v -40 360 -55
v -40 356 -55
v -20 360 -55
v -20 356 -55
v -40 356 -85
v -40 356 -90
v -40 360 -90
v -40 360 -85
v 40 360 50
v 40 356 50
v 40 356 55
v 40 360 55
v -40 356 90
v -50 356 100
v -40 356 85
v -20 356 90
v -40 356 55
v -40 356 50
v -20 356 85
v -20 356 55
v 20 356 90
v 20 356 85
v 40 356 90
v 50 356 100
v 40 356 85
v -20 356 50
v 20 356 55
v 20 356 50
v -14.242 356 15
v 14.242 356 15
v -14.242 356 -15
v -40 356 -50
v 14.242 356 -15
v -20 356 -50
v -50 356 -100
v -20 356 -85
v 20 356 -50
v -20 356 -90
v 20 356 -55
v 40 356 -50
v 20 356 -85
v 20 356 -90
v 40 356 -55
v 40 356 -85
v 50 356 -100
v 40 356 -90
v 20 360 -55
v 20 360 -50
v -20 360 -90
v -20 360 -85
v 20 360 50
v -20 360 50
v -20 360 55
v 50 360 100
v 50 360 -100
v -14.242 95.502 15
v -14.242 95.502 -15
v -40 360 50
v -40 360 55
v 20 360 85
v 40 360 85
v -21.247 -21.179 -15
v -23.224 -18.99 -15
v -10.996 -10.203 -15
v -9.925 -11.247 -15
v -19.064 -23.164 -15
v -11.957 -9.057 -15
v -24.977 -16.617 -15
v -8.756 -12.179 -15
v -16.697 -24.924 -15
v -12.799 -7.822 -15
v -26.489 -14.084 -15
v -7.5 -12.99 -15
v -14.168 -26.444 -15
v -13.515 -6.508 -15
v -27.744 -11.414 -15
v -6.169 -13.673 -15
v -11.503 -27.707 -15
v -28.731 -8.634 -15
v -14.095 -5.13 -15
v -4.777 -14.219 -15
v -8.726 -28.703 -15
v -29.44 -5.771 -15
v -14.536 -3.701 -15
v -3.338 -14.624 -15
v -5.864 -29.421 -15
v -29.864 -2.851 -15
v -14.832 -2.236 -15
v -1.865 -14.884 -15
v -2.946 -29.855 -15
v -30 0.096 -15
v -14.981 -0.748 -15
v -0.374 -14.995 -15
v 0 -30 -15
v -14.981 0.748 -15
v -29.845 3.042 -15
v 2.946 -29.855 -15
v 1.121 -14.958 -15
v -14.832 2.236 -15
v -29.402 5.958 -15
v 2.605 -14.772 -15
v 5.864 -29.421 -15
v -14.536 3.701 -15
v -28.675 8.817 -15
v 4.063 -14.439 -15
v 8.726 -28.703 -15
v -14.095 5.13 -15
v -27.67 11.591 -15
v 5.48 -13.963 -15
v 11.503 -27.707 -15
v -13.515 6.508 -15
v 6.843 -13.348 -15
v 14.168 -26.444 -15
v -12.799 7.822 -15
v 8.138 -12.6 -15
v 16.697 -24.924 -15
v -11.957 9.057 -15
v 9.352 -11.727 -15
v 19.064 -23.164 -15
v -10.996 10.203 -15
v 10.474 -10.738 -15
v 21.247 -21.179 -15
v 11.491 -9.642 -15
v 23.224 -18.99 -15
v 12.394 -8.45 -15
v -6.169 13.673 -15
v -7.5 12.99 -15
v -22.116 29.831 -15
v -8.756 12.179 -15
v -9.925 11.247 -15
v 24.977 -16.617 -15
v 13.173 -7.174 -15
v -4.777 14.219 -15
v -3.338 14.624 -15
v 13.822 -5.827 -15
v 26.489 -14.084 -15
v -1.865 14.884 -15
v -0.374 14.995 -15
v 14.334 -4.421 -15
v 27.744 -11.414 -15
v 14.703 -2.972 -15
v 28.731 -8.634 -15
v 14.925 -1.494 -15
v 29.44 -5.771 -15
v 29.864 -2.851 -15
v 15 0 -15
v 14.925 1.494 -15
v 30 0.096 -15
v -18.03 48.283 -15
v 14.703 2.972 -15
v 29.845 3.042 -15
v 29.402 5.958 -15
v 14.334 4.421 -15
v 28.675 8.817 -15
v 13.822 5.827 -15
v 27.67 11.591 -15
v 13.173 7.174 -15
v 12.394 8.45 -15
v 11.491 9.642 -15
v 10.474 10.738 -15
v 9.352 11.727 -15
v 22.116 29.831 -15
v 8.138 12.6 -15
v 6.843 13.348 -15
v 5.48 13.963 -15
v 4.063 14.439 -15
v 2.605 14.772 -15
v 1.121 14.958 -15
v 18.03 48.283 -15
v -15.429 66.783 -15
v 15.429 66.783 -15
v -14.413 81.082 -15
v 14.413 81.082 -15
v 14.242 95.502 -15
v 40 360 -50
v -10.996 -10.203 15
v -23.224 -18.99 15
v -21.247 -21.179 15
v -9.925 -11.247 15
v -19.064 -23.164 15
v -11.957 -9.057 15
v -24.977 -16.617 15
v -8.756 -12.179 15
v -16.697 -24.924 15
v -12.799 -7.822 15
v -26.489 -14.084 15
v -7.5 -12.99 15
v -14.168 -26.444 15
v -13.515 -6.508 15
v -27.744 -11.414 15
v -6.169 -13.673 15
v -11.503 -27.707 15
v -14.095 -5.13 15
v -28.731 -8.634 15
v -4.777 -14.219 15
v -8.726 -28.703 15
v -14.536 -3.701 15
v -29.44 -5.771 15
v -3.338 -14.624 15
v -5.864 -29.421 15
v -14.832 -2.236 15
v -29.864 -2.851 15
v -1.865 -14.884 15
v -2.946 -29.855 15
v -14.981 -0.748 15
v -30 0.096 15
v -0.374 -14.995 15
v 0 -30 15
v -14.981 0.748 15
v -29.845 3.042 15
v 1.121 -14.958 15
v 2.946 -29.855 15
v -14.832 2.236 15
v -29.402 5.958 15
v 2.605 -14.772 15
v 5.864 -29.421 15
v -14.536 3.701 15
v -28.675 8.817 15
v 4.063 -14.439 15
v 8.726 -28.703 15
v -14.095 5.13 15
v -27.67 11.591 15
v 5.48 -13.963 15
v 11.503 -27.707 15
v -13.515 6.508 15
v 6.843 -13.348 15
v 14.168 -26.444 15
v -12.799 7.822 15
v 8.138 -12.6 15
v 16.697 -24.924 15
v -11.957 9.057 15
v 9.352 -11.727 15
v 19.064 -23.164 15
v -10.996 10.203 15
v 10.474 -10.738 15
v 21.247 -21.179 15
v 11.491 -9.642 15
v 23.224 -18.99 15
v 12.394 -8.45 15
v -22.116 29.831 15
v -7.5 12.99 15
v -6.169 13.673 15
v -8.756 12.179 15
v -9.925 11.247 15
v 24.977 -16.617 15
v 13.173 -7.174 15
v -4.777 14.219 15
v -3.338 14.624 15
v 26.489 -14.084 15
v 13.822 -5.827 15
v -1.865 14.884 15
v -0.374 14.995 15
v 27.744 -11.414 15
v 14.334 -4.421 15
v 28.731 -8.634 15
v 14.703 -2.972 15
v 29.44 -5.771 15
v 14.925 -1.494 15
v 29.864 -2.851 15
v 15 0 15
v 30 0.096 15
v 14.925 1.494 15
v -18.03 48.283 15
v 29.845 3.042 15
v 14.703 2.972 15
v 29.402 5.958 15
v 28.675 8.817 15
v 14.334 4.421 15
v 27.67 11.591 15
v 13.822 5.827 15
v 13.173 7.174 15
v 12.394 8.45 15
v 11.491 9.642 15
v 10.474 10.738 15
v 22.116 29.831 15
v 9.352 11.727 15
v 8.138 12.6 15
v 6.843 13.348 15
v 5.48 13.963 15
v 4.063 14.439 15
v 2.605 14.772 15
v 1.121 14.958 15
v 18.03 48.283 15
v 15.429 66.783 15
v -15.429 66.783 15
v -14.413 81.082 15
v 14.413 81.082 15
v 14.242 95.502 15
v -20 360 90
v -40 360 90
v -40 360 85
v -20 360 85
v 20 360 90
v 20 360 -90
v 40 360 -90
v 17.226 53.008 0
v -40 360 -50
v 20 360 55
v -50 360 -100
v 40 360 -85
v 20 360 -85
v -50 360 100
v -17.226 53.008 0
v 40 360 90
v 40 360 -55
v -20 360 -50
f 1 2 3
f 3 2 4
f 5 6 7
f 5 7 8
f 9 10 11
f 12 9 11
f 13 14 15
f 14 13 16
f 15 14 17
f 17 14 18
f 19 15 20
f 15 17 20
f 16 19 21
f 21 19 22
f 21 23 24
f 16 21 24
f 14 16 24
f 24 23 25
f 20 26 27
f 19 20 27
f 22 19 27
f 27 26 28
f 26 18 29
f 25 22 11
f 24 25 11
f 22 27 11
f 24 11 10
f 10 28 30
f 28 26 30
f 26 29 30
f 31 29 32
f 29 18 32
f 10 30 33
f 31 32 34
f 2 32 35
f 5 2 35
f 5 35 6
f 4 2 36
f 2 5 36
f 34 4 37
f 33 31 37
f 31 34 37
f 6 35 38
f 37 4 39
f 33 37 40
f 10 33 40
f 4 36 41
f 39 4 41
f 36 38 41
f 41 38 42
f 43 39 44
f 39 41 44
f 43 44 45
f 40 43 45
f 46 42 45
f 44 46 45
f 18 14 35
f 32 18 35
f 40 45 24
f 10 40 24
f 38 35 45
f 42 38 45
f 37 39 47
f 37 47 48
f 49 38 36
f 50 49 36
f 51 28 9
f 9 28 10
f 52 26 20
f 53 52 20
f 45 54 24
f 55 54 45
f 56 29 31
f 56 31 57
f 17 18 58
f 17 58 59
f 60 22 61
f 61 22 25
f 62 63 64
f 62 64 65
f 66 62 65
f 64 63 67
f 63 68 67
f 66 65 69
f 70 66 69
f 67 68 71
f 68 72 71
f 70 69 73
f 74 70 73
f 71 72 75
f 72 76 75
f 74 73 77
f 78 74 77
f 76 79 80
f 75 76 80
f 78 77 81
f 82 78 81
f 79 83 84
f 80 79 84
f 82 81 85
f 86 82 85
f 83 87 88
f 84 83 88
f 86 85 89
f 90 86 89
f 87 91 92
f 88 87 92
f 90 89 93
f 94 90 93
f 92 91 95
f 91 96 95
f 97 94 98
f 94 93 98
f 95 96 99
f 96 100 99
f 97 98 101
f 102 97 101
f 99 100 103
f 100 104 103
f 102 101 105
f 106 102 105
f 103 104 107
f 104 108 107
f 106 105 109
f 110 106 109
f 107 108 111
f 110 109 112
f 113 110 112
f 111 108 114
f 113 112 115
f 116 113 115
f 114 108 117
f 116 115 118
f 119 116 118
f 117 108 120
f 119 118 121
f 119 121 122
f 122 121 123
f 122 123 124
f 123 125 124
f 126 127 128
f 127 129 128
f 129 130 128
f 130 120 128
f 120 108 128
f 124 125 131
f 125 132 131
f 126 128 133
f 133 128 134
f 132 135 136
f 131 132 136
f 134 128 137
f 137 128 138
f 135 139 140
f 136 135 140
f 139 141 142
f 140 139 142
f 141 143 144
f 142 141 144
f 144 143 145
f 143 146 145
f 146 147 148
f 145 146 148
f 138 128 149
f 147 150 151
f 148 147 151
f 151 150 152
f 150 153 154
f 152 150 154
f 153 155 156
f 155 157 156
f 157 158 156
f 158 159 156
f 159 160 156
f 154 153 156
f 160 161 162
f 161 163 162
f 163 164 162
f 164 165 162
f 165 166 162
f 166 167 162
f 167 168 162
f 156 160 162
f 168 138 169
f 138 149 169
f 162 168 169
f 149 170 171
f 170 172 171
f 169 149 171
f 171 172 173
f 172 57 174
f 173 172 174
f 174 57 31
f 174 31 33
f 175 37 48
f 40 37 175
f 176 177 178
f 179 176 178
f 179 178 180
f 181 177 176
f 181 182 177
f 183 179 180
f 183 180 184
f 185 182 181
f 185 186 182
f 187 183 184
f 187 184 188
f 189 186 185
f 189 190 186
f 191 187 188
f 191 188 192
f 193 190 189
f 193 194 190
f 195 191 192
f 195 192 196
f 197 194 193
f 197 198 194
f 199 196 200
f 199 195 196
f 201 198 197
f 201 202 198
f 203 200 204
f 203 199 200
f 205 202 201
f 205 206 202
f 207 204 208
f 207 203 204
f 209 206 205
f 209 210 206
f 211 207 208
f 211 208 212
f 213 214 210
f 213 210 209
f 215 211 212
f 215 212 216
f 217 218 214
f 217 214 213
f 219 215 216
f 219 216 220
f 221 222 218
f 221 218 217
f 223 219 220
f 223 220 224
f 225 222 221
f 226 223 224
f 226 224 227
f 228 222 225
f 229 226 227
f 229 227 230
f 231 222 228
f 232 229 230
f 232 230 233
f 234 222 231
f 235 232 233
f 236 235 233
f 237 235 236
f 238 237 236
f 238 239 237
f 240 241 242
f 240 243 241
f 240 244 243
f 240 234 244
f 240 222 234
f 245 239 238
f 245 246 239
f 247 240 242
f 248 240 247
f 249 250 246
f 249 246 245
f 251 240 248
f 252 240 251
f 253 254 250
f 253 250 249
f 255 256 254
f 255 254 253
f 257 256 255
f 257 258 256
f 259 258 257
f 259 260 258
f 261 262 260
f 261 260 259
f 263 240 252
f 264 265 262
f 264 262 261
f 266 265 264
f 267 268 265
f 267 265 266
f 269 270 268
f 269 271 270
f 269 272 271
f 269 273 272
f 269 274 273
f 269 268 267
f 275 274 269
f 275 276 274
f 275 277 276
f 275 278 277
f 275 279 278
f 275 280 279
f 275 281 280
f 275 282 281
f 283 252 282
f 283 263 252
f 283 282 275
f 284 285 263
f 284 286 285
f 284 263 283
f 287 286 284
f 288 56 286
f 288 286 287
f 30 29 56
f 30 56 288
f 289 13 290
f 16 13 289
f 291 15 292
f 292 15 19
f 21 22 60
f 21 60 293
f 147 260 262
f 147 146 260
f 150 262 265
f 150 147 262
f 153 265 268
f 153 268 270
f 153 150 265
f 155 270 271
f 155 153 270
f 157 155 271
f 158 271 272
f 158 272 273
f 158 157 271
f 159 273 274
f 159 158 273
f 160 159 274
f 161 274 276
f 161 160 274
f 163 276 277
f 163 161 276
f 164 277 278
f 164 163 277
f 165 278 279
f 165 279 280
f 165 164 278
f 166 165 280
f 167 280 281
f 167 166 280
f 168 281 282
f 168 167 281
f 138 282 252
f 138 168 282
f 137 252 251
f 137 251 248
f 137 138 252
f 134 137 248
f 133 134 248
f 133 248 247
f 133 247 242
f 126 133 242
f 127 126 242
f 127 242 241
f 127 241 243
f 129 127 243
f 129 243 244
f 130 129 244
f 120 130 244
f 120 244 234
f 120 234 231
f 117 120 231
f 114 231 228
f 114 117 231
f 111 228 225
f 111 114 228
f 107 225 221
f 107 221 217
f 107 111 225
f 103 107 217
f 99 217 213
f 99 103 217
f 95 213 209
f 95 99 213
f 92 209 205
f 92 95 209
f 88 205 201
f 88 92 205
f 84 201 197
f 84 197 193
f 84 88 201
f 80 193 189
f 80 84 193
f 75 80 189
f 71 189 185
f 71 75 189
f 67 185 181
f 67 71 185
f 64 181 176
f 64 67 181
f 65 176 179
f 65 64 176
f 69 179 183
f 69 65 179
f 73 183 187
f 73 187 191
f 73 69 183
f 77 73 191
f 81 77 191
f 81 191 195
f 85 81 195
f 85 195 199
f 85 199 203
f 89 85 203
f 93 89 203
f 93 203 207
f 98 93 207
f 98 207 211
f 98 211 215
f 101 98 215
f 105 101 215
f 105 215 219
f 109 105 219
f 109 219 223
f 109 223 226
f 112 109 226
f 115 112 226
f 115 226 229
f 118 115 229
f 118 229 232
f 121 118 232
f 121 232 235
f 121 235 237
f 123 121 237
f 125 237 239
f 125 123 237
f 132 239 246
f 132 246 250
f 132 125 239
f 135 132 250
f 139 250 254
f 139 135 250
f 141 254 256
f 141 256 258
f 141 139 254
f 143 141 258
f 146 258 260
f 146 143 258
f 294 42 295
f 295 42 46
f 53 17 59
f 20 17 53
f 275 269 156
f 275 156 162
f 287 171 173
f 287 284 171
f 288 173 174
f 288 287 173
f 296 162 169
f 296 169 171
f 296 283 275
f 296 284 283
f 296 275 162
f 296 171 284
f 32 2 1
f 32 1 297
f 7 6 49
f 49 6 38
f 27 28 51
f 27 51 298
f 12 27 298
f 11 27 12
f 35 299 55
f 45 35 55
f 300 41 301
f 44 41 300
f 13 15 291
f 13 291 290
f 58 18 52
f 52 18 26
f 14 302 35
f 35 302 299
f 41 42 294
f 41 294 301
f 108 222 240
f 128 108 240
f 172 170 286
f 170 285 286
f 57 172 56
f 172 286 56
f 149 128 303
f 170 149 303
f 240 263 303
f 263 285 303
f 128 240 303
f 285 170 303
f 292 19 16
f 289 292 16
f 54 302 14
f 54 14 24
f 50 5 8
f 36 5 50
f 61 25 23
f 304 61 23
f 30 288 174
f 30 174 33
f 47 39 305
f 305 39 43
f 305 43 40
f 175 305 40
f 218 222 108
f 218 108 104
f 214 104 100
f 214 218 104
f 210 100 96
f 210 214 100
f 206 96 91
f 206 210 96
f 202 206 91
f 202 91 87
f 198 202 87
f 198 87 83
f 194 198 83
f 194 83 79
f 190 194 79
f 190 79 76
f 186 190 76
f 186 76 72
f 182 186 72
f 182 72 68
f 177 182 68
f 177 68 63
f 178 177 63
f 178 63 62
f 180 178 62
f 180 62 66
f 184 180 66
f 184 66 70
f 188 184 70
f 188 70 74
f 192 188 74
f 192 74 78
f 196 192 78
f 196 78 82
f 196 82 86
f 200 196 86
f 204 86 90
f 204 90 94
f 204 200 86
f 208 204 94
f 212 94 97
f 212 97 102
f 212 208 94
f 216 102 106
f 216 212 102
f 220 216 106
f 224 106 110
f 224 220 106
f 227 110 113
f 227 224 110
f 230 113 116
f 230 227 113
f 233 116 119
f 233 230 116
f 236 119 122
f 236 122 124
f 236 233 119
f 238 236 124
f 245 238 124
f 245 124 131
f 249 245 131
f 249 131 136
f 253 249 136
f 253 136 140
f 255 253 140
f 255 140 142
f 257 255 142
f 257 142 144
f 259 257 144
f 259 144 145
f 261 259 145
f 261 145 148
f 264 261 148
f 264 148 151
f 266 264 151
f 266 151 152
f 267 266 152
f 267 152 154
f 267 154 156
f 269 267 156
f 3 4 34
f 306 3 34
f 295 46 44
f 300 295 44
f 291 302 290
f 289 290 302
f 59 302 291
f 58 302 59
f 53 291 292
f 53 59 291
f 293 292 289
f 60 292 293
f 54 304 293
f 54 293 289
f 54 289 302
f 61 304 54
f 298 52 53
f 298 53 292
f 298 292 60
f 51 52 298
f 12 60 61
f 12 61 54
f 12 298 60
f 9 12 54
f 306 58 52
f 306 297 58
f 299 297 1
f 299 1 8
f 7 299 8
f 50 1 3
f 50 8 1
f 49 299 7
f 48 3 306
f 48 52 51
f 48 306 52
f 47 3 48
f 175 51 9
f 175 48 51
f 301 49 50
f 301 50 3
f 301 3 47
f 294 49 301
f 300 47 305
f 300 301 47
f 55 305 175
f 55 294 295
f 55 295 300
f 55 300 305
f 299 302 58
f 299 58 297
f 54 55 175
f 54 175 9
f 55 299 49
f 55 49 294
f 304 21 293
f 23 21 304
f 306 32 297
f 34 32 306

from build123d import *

# Parameters (mm, degrees)
SKETCH1_R           = 30
SKETCH1_R_2         = 15
BOSS_EXTRUDE1_DEPTH = 15
BOSS_EXTRUDE2_DEPTH = 30
SKETCH3_W           = 100
SKETCH3_H           = 200
BOSS_EXTRUDE3_DEPTH = 4
SKETCH4_W           = 20
SKETCH4_H           = 5
CUT_EXTRUDE1_DEPTH  = 4


with BuildPart() as part:
    # Sketch1 → Boss-Extrude1 (new body, symmetric)
    with BuildSketch(Plane.XY):
        Circle(SKETCH1_R)
        Circle(SKETCH1_R_2, mode=Mode.SUBTRACT)
    extrude(amount=BOSS_EXTRUDE1_DEPTH, both=True)

    # Sketch2 → Boss-Extrude2 (add)
    with BuildSketch(Plane.XY.offset(15)):
        with BuildLine():
            Line((14.241500135, 95.50219019), (14.241500135, 360))
            Line((14.241500135, 360), (-14.241500135, 360))
            Line((-14.241500135, 360), (-14.241500135, 95.50219019))
            add(Edge.make_bspline(
                [(-27.670395385, 11.590911061), (-13.495600511, 52.469413615), (-14.241500135, 95.50219019)],
                knots=[0, 0, 0, 1, 1, 1], degree=2))
            ThreePointArc((-27.670395385, 11.590911061), (0, 30), (27.670395385, 11.590911061))
            add(Edge.make_bspline(
                [(27.670395385, 11.590911061), (13.495600511, 52.469413615), (14.241500135, 95.50219019)],
                knots=[0, 0, 0, 1, 1, 1], degree=2))
        make_face()
    extrude(amount=-BOSS_EXTRUDE2_DEPTH)

    # Sketch3 → Boss-Extrude3 (add)
    with BuildSketch(Plane(origin=(0, 360, 0), x_dir=(1, 0, 0), z_dir=(0, 1, 0))):
        Rectangle(SKETCH3_W, SKETCH3_H)
    extrude(amount=-BOSS_EXTRUDE3_DEPTH)

    # Sketch4 → Cut-Extrude1 (cut)
    with BuildSketch(Plane.XZ.offset(-356)):
        with Locations((30, 87.5)):
            Rectangle(SKETCH4_W, SKETCH4_H)
        with Locations((-30, 87.5)):
            Rectangle(SKETCH4_W, SKETCH4_H)
        with Locations((-30, -87.5)):
            Rectangle(SKETCH4_W, SKETCH4_H)
        with Locations((30, -87.5)):
            Rectangle(SKETCH4_W, SKETCH4_H)
        with Locations((-30, 52.5)):
            Rectangle(SKETCH4_W, SKETCH4_H)
        with Locations((30, 52.5)):
            Rectangle(SKETCH4_W, SKETCH4_H)
        with Locations((30, -52.5)):
            Rectangle(SKETCH4_W, SKETCH4_H)
        with Locations((-30, -52.5)):
            Rectangle(SKETCH4_W, SKETCH4_H)
    extrude(amount=-CUT_EXTRUDE1_DEPTH, mode=Mode.SUBTRACT)


solid = part.part
